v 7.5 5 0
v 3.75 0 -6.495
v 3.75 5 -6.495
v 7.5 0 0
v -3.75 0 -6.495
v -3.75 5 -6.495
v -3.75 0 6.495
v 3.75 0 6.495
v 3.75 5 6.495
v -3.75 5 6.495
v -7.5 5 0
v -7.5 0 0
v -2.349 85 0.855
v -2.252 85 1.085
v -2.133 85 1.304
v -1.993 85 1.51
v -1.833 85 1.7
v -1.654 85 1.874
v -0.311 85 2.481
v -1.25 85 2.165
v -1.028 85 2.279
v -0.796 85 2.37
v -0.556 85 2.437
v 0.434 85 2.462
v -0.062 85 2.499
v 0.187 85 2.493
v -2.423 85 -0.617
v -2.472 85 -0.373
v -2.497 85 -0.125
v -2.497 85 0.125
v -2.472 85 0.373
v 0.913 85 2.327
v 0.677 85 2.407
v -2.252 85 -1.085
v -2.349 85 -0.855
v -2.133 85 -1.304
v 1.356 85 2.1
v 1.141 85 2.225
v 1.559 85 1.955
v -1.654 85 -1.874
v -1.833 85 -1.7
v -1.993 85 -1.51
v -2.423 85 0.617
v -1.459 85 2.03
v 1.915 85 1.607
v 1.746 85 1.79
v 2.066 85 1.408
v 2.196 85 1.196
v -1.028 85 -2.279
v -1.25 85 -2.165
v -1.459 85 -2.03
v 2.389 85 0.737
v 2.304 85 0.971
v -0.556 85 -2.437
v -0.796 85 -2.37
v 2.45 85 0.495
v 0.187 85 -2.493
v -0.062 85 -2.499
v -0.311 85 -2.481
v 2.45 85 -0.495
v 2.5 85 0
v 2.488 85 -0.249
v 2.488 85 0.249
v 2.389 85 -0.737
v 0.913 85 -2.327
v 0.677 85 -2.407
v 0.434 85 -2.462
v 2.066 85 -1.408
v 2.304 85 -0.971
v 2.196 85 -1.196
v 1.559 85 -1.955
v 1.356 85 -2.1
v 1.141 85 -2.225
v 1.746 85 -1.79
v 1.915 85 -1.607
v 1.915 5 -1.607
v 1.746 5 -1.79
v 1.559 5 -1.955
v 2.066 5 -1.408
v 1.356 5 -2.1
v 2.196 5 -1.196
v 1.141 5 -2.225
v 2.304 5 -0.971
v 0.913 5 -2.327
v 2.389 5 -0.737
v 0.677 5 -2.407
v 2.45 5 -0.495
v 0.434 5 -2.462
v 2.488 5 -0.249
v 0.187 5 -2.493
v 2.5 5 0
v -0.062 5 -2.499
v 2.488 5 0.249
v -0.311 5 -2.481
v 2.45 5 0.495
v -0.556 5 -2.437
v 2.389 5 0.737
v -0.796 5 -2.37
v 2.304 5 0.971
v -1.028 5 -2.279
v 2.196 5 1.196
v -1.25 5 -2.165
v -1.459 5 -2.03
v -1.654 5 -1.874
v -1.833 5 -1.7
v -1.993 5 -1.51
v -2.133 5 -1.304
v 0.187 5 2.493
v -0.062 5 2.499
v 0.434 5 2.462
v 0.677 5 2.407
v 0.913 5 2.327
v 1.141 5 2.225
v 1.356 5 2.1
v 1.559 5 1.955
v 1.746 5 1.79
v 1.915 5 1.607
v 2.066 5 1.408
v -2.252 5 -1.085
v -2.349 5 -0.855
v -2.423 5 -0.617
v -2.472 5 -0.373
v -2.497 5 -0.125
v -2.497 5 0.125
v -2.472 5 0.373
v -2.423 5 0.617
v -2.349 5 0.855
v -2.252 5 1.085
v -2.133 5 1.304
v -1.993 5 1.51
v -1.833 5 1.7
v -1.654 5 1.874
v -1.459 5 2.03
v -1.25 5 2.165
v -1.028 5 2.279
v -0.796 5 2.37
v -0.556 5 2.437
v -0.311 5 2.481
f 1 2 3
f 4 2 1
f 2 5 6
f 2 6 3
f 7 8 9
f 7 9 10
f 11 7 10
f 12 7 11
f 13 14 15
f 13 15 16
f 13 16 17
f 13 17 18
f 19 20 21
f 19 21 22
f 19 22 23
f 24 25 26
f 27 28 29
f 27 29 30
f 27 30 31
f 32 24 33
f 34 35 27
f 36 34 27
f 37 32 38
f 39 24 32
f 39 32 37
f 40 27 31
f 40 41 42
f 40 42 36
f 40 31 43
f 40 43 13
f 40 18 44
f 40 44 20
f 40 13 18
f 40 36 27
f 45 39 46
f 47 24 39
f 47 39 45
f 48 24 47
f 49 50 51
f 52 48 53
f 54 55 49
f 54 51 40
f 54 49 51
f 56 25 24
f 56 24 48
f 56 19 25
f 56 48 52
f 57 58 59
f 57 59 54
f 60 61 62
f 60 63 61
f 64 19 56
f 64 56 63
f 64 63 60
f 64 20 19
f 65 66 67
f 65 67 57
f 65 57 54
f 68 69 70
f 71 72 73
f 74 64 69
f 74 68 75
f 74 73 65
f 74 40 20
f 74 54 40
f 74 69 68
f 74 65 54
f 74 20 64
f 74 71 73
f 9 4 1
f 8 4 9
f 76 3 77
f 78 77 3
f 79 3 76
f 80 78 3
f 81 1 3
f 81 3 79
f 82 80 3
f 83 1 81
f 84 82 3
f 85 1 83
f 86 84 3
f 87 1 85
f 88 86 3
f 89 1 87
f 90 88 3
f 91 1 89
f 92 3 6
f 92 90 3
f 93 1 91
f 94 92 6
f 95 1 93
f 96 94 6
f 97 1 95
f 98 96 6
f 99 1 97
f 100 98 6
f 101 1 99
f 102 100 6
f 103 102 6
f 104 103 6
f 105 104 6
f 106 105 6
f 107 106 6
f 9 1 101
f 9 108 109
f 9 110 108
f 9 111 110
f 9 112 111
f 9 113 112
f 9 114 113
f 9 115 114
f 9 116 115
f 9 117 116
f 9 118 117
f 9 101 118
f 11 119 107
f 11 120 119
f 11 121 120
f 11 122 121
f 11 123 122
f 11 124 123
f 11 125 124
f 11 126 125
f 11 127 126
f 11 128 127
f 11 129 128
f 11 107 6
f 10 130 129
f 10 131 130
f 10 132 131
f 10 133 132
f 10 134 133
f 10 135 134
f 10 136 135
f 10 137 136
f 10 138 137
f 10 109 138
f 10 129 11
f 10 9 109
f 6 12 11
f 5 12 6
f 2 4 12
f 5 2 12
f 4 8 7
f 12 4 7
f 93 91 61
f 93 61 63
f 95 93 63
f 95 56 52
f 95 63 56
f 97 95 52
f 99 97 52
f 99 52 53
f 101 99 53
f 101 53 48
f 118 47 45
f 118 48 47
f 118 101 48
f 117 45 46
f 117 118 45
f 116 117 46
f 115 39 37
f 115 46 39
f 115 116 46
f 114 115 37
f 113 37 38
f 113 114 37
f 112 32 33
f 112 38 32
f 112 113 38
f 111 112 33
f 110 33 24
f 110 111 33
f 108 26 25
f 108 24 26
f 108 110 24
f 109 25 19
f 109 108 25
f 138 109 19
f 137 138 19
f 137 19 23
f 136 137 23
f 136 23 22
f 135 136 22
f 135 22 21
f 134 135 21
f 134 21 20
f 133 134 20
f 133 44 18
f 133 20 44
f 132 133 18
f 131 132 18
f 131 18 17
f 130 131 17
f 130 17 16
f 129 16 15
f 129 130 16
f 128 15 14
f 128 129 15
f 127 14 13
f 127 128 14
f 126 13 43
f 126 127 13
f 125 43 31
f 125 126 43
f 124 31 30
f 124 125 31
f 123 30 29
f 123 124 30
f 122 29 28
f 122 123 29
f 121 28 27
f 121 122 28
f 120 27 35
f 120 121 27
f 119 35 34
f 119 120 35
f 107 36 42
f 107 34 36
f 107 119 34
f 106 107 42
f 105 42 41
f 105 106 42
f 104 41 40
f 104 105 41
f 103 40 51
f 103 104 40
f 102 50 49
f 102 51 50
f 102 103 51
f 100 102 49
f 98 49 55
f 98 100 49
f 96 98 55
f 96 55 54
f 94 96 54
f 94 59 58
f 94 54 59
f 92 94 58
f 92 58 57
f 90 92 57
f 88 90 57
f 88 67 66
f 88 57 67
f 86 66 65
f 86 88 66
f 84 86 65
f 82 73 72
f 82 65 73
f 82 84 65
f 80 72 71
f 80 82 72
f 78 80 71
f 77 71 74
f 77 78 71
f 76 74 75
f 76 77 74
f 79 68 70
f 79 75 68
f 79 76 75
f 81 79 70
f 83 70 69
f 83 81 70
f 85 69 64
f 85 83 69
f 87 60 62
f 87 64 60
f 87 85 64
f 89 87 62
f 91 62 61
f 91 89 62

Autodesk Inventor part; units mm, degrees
ref_plane "YZ Plane" through (0, 0, 0) normal (1, 0, 0) x (0, 1, 0)
ref_plane "XZ Plane" through (0, 0, 0) normal (0, 1, 0) x (-1, 0, 0)
ref_plane "XY Plane" through (0, 0, 0) normal (0, 0, 1) x (1, 0, 0)
sketch "Sketch1" plane through (0, 0, 0) normal (0, 1, 0) x (-1, 0, 0)
  circle A0 centre (0, 0) radius 7.5
  dimension "d0" = 15
extrude "Extrusion1" add sketch "Sketch1" along normal blind 5
sketch "Sketch2" plane through (0, 5, 0) normal (0, 1, 0) x (1, 0, 0)
  circle A0 centre (0, 0) radius 2.5
  dimension "d3" = 5
extrude "Extrusion2" add sketch "Sketch2" along normal blind 80
thread "Thread1" size "M5x0.8" class "6g" standard "ANSI Metric M Profile" length 80
sketch "Sketch3" plane through (0, 0, 0) normal (0, -1, 0) x (1, 0, 0)
  circle A0 centre (0, 0) radius 7.5 projected
  line L0 (-7.5, 0) -> (0, 0)
  line L1 (0, 0) -> (-3.75, -6.4952)
  line L2 (0, 0) -> (3.75, -6.4952)
  line L3 (0, 0) -> (7.5, 0) construction
  line L4 (0, 0) -> (3.75, 6.4952)
  line L5 (0, 0) -> (7.5, 0) construction
  line L6 (0, 0) -> (-3.75, 6.4952)
  line L7 (0, 0) -> (7.5, 0) construction
  line L8 (-7.5, 0) -> (-3.75, -6.4952)
  line L9 (-3.75, -6.4952) -> (3.75, -6.4952)
  line L10 (3.75, -6.4952) -> (7.5, 0)
  line L11 (7.5, 0) -> (3.75, 6.4952)
  line L12 (3.75, 6.4952) -> (-3.75, 6.4952)
  line L13 (-3.75, 6.4952) -> (-7.5, 0)
  point P0 (7.5, 0)
  point P1 (7.5, 0)
  dimension "d8" = 60
  dimension "d9" = 60
  dimension "d10" = 60
  dimension "d11" = 120
extrude "Extrusion3" cut sketch "Sketch3" against normal through all contours L11 A0 | A0 L10 | L12 A0 | A0 L9 | L13 A0 | A0 L8
properties part number "Bolt" material "Steel, Mild"
